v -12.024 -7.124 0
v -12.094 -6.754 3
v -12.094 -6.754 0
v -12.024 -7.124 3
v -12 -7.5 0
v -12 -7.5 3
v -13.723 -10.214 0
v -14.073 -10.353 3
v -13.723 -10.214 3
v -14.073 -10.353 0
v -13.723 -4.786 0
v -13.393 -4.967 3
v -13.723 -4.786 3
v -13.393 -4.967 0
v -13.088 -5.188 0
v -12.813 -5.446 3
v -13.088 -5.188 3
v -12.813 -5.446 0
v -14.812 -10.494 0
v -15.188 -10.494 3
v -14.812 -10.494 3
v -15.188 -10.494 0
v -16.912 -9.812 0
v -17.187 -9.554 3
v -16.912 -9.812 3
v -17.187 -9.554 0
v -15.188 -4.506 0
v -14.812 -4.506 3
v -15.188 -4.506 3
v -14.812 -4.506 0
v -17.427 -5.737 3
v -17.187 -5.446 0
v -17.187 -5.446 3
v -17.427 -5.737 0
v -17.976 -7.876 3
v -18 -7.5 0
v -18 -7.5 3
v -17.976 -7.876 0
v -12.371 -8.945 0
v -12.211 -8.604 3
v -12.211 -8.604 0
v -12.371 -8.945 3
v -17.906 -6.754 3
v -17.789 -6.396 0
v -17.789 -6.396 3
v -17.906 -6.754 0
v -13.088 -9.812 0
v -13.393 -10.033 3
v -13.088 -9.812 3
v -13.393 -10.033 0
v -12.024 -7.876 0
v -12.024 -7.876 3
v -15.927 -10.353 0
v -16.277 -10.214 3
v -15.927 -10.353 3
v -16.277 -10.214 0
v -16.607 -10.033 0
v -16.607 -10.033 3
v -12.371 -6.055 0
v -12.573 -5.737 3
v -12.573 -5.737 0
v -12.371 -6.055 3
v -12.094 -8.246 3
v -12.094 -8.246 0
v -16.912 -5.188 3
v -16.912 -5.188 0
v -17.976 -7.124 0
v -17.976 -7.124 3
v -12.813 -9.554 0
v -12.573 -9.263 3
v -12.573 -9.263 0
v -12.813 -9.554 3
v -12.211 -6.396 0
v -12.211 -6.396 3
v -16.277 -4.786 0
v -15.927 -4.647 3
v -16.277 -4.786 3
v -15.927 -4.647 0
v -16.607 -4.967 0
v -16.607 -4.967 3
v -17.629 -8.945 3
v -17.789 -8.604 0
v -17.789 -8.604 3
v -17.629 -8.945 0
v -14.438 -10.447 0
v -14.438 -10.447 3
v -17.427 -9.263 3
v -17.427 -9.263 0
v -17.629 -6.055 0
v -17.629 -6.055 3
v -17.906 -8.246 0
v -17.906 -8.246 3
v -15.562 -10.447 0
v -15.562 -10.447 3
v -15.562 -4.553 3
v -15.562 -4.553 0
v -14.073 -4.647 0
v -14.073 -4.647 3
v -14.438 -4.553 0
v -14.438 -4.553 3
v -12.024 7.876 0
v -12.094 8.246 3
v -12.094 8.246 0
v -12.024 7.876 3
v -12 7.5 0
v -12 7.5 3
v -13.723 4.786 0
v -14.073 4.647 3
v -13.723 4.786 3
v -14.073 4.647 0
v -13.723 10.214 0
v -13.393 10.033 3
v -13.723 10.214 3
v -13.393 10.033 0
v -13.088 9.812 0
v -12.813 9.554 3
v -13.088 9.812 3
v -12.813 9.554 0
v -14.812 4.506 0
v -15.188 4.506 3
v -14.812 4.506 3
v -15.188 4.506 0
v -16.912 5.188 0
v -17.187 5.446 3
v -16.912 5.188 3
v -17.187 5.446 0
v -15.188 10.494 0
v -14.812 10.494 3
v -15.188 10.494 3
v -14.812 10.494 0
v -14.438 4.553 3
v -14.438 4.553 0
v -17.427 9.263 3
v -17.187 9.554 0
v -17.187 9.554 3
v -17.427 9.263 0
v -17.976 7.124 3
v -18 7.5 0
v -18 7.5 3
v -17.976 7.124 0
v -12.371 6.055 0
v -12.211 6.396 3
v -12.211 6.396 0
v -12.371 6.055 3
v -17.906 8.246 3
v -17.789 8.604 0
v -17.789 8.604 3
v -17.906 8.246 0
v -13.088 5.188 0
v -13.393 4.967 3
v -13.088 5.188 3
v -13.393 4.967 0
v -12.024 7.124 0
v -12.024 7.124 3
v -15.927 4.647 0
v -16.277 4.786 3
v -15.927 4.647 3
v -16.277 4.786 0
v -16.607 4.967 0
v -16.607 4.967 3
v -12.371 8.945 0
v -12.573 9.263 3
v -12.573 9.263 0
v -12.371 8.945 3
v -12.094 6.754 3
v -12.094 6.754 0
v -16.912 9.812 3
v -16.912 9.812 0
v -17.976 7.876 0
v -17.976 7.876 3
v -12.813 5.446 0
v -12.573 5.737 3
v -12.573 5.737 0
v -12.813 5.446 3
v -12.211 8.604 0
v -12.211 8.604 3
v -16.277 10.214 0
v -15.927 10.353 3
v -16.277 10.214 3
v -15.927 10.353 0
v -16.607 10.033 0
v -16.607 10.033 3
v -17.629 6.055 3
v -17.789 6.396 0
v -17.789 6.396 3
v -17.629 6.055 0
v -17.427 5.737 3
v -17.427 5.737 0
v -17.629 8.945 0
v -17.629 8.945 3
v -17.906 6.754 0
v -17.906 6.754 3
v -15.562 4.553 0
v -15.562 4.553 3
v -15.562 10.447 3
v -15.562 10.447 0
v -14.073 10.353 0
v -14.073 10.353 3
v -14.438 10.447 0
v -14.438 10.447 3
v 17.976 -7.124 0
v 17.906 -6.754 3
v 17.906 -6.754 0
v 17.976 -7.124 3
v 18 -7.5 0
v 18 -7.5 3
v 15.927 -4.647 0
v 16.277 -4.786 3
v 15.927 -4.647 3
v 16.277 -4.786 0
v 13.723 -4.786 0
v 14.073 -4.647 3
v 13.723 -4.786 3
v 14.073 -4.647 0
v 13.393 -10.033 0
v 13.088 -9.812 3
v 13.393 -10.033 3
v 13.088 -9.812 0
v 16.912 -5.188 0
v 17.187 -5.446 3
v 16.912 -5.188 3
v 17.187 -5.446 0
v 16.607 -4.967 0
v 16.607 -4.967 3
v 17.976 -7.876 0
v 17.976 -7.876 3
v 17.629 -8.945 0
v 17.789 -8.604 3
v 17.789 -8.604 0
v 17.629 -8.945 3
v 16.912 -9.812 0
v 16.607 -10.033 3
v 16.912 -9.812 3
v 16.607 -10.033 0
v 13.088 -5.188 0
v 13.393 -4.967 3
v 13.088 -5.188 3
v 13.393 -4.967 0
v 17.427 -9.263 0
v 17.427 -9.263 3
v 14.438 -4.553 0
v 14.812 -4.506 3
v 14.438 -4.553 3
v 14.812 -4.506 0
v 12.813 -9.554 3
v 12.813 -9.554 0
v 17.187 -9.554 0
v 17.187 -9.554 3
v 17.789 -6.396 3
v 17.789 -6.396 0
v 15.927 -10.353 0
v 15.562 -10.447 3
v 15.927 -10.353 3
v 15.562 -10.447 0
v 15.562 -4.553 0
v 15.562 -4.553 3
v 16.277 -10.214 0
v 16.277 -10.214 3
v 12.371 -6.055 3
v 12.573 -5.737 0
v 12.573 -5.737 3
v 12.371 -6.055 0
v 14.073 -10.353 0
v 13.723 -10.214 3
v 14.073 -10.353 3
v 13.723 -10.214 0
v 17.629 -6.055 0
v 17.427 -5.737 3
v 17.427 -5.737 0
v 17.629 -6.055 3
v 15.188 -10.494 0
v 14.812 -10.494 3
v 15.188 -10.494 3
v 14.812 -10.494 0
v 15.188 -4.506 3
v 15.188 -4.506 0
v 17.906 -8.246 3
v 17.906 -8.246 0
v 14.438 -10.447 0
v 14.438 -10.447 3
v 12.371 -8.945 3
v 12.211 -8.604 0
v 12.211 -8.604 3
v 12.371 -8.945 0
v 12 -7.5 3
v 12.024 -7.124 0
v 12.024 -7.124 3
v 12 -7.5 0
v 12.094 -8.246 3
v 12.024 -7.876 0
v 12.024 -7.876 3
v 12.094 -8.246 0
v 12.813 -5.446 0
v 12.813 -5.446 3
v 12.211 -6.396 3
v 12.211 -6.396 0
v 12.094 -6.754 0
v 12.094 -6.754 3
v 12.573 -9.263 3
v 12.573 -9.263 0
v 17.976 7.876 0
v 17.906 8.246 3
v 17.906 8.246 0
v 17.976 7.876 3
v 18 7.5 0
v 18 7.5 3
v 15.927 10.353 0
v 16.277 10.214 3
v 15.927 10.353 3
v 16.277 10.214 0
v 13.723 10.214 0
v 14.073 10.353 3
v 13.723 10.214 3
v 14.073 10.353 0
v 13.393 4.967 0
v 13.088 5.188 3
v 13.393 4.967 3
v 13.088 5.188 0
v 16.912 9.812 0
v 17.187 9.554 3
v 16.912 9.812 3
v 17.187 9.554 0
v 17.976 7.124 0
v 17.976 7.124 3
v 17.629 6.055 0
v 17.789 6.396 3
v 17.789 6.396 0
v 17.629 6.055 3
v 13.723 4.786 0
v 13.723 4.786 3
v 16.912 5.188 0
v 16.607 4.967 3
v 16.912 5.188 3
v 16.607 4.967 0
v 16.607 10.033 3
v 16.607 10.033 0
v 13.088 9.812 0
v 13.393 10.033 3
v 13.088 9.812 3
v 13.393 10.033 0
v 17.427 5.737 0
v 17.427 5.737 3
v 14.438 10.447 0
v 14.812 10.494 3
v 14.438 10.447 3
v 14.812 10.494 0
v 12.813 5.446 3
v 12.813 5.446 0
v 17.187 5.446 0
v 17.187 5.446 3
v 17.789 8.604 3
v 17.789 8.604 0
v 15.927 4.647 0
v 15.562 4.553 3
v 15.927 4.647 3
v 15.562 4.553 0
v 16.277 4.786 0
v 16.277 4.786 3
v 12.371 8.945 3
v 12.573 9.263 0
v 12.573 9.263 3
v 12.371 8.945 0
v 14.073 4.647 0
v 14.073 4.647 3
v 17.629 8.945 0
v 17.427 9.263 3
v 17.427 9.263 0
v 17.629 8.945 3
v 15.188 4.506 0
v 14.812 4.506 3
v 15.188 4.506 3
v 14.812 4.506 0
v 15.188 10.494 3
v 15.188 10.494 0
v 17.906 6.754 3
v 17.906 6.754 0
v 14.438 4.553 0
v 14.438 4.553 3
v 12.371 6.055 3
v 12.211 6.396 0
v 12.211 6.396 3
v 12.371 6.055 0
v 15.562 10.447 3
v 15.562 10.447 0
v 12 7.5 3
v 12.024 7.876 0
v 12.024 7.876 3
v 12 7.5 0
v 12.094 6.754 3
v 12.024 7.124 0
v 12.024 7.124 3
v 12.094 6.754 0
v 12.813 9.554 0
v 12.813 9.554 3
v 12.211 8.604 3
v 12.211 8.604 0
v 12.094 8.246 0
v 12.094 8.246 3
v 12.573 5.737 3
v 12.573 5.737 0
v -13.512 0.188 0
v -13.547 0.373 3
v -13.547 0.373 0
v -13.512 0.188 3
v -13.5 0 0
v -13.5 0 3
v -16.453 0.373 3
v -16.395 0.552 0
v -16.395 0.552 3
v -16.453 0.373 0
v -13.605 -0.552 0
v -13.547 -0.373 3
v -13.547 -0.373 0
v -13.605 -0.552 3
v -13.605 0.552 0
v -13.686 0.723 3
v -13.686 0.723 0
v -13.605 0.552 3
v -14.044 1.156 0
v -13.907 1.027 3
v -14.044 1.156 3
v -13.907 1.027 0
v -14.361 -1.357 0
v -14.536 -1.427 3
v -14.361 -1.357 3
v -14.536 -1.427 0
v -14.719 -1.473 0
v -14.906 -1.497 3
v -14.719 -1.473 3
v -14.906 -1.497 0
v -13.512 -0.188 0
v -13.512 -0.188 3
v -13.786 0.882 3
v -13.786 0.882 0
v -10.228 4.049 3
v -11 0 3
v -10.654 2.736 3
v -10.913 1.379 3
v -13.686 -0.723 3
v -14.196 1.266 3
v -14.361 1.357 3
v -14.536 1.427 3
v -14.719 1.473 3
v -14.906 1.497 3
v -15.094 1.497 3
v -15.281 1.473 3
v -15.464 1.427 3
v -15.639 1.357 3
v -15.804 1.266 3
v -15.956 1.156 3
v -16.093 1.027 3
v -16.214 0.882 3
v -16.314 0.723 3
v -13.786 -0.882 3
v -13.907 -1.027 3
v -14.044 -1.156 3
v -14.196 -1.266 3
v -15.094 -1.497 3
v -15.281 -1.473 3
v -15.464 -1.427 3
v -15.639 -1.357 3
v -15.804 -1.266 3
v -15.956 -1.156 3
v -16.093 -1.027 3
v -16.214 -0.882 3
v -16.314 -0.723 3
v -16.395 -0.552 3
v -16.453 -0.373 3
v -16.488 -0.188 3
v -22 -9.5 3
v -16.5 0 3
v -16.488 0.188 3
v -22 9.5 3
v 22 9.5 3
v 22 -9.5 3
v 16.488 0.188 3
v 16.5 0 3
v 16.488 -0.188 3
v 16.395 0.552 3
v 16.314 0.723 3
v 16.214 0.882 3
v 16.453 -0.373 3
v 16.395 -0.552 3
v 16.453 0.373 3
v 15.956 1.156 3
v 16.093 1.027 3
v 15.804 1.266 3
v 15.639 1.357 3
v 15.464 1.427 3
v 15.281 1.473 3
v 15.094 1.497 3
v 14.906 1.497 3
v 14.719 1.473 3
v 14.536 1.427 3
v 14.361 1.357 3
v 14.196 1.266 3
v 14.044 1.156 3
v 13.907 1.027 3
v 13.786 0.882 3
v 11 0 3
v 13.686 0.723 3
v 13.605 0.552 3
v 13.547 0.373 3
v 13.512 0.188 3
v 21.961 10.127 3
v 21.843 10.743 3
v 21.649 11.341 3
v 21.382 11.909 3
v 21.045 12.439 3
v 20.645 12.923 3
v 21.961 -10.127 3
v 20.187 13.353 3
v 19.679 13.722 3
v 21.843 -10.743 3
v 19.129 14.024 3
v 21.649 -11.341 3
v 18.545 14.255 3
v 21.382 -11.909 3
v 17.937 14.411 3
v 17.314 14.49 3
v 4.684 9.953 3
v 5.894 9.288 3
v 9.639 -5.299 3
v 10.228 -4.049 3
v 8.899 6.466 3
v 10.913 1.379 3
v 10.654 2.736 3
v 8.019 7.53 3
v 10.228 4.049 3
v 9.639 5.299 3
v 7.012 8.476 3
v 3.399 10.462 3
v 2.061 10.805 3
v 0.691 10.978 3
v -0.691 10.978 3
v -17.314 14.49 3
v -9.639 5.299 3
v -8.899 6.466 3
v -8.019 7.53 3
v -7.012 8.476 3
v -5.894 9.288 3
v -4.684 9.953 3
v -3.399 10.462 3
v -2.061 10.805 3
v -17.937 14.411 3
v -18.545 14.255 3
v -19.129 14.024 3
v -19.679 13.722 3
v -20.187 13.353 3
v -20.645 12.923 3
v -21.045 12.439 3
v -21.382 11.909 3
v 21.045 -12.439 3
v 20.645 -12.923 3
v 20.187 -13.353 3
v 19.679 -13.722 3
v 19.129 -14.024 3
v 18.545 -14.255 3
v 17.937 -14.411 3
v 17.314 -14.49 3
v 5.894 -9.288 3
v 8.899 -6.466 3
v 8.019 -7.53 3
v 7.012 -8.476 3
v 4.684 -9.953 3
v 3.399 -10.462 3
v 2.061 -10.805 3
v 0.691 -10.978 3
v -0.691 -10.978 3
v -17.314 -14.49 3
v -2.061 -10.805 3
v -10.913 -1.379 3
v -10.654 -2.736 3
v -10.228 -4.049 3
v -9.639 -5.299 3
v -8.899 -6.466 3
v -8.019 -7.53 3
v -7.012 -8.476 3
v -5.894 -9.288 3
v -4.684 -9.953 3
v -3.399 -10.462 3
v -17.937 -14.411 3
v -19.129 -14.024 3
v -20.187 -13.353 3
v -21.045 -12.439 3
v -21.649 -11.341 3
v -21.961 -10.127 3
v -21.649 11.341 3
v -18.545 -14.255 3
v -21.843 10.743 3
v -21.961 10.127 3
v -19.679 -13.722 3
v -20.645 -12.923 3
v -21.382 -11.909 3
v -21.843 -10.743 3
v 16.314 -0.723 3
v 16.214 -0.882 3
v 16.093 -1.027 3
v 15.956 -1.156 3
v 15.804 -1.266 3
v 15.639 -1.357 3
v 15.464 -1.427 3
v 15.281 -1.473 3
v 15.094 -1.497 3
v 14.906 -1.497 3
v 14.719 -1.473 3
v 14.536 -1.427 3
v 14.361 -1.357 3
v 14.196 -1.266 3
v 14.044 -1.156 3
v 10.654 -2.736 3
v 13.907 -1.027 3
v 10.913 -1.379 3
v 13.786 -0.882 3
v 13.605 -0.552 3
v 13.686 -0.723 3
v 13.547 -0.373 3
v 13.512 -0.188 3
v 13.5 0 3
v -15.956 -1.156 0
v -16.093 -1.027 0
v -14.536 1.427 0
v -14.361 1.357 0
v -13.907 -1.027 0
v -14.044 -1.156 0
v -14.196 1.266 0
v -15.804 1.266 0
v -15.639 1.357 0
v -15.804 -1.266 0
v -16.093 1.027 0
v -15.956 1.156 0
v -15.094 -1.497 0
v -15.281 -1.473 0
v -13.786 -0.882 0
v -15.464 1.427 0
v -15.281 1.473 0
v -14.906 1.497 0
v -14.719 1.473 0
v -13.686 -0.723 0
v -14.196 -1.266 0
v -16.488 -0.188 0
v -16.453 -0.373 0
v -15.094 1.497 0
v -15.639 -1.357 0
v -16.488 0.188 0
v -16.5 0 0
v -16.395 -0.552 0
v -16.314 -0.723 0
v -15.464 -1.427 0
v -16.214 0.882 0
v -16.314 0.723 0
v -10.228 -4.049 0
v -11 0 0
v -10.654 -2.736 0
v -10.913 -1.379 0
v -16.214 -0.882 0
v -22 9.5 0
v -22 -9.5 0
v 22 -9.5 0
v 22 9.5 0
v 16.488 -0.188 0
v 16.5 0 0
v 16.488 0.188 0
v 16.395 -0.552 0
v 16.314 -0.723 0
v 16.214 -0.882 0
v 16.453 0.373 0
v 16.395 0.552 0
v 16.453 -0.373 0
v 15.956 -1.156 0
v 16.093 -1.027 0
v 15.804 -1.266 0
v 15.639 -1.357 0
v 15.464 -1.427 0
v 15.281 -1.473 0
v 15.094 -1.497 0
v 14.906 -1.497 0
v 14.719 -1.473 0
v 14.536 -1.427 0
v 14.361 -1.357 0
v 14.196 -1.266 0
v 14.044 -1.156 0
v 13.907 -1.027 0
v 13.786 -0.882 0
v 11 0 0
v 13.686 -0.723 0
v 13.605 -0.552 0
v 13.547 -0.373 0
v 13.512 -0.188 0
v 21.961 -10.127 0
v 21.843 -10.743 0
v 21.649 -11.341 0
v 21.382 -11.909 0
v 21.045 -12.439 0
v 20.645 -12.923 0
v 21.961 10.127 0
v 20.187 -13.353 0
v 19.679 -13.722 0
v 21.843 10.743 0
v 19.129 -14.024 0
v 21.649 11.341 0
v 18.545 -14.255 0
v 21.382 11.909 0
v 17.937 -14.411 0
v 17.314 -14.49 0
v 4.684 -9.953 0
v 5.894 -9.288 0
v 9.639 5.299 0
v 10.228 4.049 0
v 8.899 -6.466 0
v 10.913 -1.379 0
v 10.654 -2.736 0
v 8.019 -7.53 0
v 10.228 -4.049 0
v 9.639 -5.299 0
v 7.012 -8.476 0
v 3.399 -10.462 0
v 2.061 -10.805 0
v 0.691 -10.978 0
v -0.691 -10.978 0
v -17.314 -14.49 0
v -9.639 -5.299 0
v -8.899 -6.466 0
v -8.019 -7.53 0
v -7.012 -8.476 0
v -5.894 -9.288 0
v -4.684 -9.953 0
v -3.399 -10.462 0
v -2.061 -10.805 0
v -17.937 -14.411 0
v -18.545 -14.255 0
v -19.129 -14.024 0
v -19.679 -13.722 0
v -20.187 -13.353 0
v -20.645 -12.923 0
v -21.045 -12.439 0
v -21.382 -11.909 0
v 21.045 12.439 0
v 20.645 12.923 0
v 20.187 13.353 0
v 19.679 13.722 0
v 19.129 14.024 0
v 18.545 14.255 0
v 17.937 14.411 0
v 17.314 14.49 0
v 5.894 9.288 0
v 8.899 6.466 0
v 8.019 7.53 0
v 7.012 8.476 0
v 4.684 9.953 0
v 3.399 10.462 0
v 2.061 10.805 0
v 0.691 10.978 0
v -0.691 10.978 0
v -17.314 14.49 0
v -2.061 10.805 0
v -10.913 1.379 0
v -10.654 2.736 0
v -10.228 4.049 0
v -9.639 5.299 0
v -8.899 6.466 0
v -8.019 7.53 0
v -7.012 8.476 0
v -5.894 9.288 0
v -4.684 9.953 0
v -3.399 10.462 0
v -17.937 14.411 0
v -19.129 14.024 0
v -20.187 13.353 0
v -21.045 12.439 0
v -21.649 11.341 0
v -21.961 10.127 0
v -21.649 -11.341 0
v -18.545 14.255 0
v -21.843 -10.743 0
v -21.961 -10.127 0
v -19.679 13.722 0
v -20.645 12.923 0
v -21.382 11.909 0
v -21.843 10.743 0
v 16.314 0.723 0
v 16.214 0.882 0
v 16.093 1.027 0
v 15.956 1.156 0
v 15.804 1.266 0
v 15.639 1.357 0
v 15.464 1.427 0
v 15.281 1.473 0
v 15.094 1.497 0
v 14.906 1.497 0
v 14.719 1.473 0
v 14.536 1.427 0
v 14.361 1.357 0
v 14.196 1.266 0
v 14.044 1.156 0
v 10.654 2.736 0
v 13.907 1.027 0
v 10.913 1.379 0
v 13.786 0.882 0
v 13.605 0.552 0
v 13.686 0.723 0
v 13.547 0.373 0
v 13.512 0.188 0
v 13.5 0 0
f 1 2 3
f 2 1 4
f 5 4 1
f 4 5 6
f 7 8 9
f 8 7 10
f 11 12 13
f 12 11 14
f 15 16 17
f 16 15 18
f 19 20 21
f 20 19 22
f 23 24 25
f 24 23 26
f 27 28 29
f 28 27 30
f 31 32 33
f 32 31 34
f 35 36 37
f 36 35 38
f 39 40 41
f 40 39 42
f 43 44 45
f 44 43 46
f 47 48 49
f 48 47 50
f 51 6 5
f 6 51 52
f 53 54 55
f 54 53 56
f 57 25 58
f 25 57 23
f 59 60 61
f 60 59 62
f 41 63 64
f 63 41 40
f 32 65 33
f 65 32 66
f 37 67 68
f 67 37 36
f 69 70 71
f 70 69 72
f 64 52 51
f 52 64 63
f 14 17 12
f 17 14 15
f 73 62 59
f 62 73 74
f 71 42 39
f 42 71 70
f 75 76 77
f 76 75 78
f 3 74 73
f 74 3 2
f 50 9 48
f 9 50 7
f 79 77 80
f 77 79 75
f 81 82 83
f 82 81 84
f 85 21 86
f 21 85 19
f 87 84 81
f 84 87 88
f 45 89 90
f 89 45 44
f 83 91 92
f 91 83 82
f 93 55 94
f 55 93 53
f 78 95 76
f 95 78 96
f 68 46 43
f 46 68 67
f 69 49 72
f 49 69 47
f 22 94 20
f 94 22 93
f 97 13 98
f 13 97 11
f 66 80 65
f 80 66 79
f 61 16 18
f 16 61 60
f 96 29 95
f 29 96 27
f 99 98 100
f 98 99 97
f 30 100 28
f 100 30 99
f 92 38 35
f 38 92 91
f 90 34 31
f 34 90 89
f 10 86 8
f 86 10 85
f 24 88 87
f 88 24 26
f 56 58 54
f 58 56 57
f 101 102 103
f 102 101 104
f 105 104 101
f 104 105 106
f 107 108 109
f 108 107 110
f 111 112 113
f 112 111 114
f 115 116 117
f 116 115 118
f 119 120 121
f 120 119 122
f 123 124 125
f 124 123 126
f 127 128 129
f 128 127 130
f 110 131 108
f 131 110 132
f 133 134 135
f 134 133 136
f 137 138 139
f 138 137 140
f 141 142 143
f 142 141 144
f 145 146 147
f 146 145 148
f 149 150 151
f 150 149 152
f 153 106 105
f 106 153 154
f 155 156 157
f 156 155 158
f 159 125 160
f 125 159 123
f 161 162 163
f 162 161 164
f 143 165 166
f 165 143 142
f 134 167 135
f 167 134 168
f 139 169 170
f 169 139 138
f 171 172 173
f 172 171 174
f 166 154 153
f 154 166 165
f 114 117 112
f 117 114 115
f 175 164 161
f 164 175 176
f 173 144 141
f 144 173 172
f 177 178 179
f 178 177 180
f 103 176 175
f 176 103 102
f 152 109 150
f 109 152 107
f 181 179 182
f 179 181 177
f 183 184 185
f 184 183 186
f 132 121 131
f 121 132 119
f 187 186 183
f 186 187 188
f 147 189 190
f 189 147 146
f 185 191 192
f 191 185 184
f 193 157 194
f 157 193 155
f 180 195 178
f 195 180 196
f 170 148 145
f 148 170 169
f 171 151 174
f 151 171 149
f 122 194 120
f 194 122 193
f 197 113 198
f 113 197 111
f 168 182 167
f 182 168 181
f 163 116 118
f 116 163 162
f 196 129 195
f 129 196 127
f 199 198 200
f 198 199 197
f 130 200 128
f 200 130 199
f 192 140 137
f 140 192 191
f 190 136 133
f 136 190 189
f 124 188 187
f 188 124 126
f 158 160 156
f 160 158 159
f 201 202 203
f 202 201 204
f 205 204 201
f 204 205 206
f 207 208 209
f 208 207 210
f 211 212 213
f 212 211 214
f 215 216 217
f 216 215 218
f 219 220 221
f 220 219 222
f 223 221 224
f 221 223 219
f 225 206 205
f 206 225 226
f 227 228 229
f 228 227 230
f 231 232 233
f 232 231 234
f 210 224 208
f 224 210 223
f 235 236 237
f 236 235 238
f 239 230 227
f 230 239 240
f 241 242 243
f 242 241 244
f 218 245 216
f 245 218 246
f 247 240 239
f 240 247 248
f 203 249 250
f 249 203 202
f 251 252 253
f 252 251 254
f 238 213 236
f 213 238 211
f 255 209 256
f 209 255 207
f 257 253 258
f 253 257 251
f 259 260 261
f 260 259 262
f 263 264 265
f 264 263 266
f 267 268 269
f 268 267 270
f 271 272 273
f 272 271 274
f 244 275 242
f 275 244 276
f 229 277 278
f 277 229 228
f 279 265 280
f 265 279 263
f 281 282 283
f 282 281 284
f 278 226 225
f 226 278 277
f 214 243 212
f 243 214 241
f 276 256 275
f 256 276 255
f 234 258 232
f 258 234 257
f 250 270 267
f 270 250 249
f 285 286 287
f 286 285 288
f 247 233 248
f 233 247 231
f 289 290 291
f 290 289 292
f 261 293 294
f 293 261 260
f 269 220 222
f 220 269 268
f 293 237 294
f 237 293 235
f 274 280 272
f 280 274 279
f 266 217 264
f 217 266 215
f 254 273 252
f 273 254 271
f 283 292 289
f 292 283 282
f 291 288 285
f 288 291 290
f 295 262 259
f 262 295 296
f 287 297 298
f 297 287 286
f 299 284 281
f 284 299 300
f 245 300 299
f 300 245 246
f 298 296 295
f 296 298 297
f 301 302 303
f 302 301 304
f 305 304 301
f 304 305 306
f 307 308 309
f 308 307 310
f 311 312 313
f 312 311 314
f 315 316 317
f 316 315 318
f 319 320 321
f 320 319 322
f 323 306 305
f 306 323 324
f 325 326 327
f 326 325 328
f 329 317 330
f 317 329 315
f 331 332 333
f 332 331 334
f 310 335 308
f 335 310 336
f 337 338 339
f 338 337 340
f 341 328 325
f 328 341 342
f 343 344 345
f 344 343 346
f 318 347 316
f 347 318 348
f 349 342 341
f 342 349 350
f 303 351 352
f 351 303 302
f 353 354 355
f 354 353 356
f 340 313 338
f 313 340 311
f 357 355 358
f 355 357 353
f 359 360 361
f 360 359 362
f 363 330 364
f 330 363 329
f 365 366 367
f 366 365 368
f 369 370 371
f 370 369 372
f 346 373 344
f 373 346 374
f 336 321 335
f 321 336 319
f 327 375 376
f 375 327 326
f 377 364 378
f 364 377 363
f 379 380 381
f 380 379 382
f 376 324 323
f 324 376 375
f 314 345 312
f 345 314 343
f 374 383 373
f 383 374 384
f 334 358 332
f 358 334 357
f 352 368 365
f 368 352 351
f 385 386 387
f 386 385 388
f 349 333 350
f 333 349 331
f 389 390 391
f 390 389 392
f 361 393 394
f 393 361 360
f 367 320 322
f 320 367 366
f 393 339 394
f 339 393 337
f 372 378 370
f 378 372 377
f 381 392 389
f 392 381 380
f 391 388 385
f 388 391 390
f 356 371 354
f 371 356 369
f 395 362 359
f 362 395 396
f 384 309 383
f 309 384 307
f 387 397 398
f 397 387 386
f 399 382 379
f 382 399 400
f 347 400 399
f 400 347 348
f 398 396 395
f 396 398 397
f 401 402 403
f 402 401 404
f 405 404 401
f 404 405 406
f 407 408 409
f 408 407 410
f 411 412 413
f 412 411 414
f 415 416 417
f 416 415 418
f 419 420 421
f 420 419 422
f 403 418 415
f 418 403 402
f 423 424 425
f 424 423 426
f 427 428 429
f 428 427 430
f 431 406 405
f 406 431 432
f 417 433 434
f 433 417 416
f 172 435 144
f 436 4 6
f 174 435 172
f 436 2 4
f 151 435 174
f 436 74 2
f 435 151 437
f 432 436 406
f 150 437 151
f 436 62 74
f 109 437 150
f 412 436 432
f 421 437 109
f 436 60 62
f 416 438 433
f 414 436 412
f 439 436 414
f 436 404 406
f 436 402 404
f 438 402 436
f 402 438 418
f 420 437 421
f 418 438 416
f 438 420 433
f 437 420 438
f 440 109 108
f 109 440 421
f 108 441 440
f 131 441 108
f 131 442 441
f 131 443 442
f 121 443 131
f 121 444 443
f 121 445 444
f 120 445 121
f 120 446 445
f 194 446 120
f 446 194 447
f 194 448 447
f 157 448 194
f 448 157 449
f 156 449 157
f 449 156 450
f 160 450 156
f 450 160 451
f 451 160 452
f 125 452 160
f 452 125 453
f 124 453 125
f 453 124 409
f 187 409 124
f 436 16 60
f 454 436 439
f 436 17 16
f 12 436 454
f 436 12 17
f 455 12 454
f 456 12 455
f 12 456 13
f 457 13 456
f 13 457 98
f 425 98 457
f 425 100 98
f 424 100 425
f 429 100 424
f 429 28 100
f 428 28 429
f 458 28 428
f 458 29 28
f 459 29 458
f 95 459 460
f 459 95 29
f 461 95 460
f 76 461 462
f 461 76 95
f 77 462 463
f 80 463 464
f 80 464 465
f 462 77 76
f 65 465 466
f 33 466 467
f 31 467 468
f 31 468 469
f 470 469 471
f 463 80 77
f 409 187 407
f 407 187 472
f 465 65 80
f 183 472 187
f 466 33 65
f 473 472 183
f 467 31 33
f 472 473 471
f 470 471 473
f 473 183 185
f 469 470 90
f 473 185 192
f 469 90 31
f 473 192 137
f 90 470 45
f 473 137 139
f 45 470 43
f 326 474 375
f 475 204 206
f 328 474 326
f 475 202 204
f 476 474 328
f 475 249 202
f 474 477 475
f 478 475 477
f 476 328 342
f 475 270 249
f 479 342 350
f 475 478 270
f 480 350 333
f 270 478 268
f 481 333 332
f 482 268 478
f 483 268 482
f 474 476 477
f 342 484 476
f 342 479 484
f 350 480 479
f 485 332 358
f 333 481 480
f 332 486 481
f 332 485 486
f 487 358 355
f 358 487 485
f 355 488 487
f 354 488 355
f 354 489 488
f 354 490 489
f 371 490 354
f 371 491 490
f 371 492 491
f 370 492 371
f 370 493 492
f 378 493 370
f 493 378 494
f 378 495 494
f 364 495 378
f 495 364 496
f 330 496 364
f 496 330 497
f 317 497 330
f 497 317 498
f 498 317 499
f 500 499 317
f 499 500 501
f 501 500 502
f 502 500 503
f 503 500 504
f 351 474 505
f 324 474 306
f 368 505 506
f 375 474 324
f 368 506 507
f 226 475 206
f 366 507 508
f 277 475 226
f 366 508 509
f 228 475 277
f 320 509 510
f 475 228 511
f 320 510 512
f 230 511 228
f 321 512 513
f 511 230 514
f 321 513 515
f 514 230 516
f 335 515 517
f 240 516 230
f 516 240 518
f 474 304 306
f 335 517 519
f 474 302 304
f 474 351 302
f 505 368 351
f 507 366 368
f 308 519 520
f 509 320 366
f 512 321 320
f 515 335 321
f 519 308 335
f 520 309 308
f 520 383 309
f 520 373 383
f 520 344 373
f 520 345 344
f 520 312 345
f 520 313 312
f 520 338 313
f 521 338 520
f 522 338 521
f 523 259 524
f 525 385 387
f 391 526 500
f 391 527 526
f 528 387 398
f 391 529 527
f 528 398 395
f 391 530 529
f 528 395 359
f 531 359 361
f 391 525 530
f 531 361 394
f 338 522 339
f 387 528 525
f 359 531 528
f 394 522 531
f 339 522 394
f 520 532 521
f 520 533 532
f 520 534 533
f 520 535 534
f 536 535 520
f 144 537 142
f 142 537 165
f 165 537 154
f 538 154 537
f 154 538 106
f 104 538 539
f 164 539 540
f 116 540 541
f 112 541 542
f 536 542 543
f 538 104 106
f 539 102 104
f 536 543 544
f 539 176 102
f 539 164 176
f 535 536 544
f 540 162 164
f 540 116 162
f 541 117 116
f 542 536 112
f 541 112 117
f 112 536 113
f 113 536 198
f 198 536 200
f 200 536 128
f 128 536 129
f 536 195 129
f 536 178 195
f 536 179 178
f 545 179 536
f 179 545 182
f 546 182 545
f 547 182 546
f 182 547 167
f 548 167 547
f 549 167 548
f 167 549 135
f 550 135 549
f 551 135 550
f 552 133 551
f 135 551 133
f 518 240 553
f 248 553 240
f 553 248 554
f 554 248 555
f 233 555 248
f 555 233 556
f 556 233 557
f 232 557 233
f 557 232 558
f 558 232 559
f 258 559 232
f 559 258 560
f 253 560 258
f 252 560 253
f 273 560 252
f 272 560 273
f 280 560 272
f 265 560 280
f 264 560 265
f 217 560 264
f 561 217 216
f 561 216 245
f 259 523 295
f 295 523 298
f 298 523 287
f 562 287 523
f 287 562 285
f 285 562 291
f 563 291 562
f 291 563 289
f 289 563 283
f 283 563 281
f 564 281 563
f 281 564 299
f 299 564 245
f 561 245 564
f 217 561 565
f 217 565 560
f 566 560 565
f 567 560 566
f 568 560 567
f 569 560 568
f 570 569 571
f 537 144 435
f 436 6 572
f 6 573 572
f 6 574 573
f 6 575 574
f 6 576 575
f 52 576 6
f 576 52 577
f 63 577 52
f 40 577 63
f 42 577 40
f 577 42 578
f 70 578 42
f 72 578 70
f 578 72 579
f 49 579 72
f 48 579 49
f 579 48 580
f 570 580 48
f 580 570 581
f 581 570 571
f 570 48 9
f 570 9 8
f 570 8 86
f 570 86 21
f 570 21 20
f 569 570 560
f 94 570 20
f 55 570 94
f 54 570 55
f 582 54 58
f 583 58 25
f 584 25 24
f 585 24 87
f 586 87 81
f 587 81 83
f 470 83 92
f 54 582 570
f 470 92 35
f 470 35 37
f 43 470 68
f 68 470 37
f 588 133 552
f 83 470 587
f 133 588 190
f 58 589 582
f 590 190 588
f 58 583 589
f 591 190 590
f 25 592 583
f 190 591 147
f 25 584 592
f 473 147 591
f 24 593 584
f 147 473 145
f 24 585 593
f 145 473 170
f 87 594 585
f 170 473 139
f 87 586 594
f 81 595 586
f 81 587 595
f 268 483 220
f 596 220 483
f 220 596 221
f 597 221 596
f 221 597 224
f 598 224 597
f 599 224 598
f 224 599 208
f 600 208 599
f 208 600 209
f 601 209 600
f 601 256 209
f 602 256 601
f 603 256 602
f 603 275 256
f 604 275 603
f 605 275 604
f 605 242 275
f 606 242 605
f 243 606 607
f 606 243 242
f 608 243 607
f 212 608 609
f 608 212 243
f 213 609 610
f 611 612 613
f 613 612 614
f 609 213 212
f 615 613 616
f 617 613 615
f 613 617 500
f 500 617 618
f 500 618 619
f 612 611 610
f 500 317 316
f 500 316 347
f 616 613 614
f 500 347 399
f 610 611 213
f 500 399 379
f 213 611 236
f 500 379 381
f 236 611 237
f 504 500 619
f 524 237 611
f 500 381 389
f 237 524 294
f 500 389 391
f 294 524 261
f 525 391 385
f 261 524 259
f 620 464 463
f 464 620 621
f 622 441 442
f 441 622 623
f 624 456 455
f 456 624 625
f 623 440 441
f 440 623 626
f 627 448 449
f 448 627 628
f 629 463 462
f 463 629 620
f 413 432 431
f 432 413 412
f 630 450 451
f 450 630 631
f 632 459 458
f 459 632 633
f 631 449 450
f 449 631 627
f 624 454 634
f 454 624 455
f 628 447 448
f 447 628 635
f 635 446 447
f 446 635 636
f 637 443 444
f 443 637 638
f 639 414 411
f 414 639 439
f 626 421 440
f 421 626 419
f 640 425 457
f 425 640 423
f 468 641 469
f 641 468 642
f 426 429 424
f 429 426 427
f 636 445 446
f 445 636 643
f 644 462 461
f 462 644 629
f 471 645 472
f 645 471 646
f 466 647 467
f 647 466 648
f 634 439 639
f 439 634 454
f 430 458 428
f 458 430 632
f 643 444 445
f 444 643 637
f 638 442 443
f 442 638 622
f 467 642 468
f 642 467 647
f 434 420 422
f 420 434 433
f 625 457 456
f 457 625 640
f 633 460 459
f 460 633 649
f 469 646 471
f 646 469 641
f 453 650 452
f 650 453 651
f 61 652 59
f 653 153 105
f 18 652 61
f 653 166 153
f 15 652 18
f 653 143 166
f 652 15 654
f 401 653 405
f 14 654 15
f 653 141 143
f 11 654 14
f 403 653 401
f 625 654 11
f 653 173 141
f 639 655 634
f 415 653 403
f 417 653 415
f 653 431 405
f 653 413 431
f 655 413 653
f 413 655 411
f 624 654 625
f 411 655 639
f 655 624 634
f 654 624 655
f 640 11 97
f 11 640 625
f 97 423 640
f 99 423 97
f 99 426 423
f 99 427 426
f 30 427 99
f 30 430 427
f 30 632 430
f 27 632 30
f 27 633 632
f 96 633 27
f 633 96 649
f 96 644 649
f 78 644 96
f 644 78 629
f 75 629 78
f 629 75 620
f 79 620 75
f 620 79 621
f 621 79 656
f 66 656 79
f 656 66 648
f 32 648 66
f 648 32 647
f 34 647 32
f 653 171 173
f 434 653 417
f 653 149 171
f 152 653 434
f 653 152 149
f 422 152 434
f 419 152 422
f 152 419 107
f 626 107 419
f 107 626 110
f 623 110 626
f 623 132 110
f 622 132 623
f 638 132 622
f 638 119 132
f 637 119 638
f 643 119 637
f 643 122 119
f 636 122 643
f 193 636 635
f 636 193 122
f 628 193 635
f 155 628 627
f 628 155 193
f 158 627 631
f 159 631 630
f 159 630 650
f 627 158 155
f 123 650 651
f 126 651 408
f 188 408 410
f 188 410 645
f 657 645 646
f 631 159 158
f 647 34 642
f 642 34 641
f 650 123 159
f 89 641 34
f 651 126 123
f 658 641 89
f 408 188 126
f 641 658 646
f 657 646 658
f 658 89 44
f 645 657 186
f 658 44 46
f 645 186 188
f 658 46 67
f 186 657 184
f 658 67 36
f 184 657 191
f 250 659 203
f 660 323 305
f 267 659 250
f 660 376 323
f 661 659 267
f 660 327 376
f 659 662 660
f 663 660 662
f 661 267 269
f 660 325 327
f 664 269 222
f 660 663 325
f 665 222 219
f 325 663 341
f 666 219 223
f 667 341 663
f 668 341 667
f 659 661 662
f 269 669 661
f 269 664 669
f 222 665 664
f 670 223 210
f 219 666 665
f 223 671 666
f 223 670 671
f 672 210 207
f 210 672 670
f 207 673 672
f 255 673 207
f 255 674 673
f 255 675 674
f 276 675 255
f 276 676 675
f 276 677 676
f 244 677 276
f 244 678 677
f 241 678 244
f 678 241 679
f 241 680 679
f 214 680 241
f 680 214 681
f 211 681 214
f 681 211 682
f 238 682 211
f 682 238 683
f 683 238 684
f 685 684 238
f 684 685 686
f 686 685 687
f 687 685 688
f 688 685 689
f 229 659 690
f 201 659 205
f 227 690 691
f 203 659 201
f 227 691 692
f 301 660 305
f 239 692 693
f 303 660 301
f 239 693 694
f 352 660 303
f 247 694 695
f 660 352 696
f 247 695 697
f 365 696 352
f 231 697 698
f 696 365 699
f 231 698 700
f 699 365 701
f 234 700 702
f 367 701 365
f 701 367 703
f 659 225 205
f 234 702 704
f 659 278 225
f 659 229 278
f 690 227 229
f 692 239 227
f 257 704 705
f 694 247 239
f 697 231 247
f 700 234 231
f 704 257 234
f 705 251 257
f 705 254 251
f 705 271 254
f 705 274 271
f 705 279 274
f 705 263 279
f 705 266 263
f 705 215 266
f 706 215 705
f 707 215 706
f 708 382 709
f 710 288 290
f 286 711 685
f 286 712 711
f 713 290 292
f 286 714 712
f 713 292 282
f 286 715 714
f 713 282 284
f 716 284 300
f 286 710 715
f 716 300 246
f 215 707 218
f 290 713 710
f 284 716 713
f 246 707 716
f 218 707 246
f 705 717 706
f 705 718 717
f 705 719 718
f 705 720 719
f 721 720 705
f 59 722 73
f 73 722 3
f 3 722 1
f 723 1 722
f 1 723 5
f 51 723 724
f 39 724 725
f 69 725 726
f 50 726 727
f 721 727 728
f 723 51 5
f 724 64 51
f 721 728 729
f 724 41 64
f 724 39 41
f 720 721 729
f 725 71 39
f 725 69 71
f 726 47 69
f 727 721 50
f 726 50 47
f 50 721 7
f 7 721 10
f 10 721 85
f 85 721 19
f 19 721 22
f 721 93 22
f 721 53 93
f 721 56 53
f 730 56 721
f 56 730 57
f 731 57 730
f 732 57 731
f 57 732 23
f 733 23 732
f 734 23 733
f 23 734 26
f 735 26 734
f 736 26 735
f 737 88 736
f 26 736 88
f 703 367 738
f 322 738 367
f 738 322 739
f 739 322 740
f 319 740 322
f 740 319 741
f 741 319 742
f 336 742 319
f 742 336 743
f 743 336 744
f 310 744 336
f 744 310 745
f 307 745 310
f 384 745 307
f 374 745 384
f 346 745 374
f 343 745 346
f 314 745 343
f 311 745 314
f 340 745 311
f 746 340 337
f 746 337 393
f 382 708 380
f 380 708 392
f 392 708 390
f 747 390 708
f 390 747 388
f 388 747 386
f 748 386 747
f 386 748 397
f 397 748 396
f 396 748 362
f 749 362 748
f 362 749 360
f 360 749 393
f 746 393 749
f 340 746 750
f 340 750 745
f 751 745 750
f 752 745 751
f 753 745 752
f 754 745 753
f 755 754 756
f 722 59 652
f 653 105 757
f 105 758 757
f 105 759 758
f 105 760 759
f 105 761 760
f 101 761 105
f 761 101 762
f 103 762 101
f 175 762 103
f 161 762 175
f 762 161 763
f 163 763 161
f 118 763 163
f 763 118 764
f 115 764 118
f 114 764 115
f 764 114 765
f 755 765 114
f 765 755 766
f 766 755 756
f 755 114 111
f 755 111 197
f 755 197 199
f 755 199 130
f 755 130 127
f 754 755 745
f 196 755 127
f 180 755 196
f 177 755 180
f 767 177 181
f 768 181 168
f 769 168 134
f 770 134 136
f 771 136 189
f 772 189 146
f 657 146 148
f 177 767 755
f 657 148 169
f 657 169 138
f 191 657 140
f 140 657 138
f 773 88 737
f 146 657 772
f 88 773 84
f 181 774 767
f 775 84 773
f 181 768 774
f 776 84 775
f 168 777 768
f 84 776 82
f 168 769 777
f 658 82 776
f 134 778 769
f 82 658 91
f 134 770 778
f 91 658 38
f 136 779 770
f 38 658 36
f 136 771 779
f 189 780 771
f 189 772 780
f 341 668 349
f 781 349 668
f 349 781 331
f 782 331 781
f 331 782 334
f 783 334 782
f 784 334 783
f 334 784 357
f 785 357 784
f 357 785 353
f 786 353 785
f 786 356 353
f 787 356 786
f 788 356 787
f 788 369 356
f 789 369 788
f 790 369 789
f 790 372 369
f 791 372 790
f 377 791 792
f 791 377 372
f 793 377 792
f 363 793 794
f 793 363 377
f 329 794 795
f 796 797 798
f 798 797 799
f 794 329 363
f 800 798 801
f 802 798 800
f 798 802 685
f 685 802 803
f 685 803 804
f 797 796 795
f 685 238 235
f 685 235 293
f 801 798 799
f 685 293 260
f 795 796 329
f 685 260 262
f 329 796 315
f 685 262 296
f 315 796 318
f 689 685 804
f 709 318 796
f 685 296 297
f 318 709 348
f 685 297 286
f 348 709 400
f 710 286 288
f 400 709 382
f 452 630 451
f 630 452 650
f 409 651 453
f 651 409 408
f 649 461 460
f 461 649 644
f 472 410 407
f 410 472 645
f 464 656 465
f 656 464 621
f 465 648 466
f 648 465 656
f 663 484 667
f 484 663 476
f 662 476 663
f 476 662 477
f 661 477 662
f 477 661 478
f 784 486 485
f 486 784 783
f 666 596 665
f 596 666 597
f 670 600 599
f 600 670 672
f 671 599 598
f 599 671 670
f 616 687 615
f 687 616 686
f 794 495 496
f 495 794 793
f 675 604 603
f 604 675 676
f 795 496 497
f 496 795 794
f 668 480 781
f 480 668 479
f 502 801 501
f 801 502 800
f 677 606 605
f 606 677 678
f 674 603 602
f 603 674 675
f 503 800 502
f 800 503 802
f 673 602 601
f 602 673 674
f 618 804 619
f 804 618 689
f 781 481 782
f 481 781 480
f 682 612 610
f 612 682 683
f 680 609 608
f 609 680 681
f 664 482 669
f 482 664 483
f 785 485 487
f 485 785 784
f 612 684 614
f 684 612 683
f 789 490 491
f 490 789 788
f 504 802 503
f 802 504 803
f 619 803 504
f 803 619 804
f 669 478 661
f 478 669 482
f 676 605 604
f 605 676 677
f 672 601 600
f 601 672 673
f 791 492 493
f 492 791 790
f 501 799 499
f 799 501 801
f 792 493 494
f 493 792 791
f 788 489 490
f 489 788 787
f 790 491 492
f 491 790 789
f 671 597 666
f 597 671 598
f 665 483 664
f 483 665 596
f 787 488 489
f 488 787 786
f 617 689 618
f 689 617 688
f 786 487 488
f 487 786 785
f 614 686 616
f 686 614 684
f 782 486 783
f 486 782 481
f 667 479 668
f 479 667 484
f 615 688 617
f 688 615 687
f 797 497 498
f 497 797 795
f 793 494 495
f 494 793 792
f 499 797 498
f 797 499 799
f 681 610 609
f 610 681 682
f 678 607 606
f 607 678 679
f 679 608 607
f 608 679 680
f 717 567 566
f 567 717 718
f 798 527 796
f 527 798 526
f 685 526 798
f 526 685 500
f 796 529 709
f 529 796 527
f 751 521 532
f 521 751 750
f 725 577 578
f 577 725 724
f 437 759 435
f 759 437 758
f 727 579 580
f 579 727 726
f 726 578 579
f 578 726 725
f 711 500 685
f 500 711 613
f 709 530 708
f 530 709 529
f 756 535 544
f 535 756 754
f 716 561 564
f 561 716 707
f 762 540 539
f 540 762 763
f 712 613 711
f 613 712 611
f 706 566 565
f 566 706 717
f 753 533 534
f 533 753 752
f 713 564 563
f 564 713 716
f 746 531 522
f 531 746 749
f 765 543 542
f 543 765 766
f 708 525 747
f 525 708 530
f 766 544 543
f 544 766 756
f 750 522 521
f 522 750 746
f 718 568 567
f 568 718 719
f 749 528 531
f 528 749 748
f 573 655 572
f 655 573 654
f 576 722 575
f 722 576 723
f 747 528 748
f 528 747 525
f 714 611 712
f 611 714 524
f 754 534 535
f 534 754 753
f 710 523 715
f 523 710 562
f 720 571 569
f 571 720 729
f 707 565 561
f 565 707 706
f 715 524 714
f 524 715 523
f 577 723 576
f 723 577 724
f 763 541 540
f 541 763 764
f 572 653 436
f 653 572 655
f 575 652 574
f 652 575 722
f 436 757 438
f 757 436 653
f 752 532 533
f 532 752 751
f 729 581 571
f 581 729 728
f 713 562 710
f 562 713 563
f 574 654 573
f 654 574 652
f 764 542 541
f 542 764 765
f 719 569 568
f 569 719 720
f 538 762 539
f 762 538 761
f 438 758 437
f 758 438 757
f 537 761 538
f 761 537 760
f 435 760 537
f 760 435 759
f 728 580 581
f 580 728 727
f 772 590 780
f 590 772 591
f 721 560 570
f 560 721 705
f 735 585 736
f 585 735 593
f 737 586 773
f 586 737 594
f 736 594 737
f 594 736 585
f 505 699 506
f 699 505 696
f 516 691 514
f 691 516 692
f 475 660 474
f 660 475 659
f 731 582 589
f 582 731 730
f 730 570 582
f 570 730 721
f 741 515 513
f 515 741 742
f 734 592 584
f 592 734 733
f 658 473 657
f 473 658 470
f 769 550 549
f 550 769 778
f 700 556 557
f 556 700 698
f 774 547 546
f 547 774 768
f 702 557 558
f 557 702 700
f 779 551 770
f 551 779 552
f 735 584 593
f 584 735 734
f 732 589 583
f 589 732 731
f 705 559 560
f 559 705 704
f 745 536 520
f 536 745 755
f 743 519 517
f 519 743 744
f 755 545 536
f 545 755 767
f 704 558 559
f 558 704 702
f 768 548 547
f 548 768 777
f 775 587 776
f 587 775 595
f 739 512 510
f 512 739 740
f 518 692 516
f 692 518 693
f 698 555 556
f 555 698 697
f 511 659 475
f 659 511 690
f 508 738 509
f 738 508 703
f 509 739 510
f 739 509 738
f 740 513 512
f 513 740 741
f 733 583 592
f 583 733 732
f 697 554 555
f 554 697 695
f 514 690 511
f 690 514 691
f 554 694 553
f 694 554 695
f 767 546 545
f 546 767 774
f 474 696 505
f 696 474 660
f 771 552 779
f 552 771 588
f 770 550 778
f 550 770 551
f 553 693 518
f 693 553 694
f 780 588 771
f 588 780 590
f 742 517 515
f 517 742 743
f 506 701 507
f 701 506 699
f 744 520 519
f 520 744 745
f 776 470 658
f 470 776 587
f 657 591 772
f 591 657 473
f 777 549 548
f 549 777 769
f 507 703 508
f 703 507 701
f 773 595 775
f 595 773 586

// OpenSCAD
$fn = 50;


difference() {
	union() {
		hull() {
			translate(v = [-17.0000000000, 9.5000000000, 0]) {
				cylinder(h = 3, r = 5);
			}
			translate(v = [17.0000000000, 9.5000000000, 0]) {
				cylinder(h = 3, r = 5);
			}
			translate(v = [-17.0000000000, -9.5000000000, 0]) {
				cylinder(h = 3, r = 5);
			}
			translate(v = [17.0000000000, -9.5000000000, 0]) {
				cylinder(h = 3, r = 5);
			}
		}
	}
	union() {
		#translate(v = [-15.0000000000, -7.5000000000, 0]) {
			cylinder(h = 3, r = 3.0000000000);
		}
		#translate(v = [-15.0000000000, 7.5000000000, 0]) {
			cylinder(h = 3, r = 3.0000000000);
		}
		#translate(v = [15.0000000000, -7.5000000000, 0]) {
			cylinder(h = 3, r = 3.0000000000);
		}
		#translate(v = [15.0000000000, 7.5000000000, 0]) {
			cylinder(h = 3, r = 3.0000000000);
		}
		#translate(v = [-15.0000000000, -7.5000000000, -100.0000000000]) {
			cylinder(h = 200, r = 3.0000000000);
		}
		#translate(v = [-15.0000000000, 7.5000000000, -100.0000000000]) {
			cylinder(h = 200, r = 3.0000000000);
		}
		#translate(v = [15.0000000000, -7.5000000000, -100.0000000000]) {
			cylinder(h = 200, r = 3.0000000000);
		}
		#translate(v = [15.0000000000, 7.5000000000, -100.0000000000]) {
			cylinder(h = 200, r = 3.0000000000);
		}
		#translate(v = [-15.0000000000, -7.5000000000, 0]) {
			cylinder(h = 3, r = 1.5000000000);
		}
		#translate(v = [-15.0000000000, 0.0000000000, 0]) {
			cylinder(h = 3, r = 1.5000000000);
		}
		#translate(v = [-15.0000000000, 7.5000000000, 0]) {
			cylinder(h = 3, r = 1.5000000000);
		}
		#translate(v = [15.0000000000, -7.5000000000, 0]) {
			cylinder(h = 3, r = 1.5000000000);
		}
		#translate(v = [15.0000000000, 0.0000000000, 0]) {
			cylinder(h = 3, r = 1.5000000000);
		}
		#translate(v = [15.0000000000, 7.5000000000, 0]) {
			cylinder(h = 3, r = 1.5000000000);
		}
		#translate(v = [-15.0000000000, -7.5000000000, 0]) {
			cylinder(h = 3, r = 1.5000000000);
		}
		#translate(v = [-15.0000000000, 0.0000000000, 0]) {
			cylinder(h = 3, r = 1.5000000000);
		}
		#translate(v = [-15.0000000000, 7.5000000000, 0]) {
			cylinder(h = 3, r = 1.5000000000);
		}
		#translate(v = [15.0000000000, -7.5000000000, 0]) {
			cylinder(h = 3, r = 1.5000000000);
		}
		#translate(v = [15.0000000000, 0.0000000000, 0]) {
			cylinder(h = 3, r = 1.5000000000);
		}
		#translate(v = [15.0000000000, 7.5000000000, 0]) {
			cylinder(h = 3, r = 1.5000000000);
		}
		#translate(v = [-15.0000000000, -7.5000000000, 0]) {
			cylinder(h = 3, r = 1.5000000000);
		}
		#translate(v = [-15.0000000000, 0.0000000000, 0]) {
			cylinder(h = 3, r = 1.5000000000);
		}
		#translate(v = [-15.0000000000, 7.5000000000, 0]) {
			cylinder(h = 3, r = 1.5000000000);
		}
		#translate(v = [15.0000000000, -7.5000000000, 0]) {
			cylinder(h = 3, r = 1.5000000000);
		}
		#translate(v = [15.0000000000, 0.0000000000, 0]) {
			cylinder(h = 3, r = 1.5000000000);
		}
		#translate(v = [15.0000000000, 7.5000000000, 0]) {
			cylinder(h = 3, r = 1.5000000000);
		}
		#cylinder(h = 3, r = 11.0000000000);
	}
}
